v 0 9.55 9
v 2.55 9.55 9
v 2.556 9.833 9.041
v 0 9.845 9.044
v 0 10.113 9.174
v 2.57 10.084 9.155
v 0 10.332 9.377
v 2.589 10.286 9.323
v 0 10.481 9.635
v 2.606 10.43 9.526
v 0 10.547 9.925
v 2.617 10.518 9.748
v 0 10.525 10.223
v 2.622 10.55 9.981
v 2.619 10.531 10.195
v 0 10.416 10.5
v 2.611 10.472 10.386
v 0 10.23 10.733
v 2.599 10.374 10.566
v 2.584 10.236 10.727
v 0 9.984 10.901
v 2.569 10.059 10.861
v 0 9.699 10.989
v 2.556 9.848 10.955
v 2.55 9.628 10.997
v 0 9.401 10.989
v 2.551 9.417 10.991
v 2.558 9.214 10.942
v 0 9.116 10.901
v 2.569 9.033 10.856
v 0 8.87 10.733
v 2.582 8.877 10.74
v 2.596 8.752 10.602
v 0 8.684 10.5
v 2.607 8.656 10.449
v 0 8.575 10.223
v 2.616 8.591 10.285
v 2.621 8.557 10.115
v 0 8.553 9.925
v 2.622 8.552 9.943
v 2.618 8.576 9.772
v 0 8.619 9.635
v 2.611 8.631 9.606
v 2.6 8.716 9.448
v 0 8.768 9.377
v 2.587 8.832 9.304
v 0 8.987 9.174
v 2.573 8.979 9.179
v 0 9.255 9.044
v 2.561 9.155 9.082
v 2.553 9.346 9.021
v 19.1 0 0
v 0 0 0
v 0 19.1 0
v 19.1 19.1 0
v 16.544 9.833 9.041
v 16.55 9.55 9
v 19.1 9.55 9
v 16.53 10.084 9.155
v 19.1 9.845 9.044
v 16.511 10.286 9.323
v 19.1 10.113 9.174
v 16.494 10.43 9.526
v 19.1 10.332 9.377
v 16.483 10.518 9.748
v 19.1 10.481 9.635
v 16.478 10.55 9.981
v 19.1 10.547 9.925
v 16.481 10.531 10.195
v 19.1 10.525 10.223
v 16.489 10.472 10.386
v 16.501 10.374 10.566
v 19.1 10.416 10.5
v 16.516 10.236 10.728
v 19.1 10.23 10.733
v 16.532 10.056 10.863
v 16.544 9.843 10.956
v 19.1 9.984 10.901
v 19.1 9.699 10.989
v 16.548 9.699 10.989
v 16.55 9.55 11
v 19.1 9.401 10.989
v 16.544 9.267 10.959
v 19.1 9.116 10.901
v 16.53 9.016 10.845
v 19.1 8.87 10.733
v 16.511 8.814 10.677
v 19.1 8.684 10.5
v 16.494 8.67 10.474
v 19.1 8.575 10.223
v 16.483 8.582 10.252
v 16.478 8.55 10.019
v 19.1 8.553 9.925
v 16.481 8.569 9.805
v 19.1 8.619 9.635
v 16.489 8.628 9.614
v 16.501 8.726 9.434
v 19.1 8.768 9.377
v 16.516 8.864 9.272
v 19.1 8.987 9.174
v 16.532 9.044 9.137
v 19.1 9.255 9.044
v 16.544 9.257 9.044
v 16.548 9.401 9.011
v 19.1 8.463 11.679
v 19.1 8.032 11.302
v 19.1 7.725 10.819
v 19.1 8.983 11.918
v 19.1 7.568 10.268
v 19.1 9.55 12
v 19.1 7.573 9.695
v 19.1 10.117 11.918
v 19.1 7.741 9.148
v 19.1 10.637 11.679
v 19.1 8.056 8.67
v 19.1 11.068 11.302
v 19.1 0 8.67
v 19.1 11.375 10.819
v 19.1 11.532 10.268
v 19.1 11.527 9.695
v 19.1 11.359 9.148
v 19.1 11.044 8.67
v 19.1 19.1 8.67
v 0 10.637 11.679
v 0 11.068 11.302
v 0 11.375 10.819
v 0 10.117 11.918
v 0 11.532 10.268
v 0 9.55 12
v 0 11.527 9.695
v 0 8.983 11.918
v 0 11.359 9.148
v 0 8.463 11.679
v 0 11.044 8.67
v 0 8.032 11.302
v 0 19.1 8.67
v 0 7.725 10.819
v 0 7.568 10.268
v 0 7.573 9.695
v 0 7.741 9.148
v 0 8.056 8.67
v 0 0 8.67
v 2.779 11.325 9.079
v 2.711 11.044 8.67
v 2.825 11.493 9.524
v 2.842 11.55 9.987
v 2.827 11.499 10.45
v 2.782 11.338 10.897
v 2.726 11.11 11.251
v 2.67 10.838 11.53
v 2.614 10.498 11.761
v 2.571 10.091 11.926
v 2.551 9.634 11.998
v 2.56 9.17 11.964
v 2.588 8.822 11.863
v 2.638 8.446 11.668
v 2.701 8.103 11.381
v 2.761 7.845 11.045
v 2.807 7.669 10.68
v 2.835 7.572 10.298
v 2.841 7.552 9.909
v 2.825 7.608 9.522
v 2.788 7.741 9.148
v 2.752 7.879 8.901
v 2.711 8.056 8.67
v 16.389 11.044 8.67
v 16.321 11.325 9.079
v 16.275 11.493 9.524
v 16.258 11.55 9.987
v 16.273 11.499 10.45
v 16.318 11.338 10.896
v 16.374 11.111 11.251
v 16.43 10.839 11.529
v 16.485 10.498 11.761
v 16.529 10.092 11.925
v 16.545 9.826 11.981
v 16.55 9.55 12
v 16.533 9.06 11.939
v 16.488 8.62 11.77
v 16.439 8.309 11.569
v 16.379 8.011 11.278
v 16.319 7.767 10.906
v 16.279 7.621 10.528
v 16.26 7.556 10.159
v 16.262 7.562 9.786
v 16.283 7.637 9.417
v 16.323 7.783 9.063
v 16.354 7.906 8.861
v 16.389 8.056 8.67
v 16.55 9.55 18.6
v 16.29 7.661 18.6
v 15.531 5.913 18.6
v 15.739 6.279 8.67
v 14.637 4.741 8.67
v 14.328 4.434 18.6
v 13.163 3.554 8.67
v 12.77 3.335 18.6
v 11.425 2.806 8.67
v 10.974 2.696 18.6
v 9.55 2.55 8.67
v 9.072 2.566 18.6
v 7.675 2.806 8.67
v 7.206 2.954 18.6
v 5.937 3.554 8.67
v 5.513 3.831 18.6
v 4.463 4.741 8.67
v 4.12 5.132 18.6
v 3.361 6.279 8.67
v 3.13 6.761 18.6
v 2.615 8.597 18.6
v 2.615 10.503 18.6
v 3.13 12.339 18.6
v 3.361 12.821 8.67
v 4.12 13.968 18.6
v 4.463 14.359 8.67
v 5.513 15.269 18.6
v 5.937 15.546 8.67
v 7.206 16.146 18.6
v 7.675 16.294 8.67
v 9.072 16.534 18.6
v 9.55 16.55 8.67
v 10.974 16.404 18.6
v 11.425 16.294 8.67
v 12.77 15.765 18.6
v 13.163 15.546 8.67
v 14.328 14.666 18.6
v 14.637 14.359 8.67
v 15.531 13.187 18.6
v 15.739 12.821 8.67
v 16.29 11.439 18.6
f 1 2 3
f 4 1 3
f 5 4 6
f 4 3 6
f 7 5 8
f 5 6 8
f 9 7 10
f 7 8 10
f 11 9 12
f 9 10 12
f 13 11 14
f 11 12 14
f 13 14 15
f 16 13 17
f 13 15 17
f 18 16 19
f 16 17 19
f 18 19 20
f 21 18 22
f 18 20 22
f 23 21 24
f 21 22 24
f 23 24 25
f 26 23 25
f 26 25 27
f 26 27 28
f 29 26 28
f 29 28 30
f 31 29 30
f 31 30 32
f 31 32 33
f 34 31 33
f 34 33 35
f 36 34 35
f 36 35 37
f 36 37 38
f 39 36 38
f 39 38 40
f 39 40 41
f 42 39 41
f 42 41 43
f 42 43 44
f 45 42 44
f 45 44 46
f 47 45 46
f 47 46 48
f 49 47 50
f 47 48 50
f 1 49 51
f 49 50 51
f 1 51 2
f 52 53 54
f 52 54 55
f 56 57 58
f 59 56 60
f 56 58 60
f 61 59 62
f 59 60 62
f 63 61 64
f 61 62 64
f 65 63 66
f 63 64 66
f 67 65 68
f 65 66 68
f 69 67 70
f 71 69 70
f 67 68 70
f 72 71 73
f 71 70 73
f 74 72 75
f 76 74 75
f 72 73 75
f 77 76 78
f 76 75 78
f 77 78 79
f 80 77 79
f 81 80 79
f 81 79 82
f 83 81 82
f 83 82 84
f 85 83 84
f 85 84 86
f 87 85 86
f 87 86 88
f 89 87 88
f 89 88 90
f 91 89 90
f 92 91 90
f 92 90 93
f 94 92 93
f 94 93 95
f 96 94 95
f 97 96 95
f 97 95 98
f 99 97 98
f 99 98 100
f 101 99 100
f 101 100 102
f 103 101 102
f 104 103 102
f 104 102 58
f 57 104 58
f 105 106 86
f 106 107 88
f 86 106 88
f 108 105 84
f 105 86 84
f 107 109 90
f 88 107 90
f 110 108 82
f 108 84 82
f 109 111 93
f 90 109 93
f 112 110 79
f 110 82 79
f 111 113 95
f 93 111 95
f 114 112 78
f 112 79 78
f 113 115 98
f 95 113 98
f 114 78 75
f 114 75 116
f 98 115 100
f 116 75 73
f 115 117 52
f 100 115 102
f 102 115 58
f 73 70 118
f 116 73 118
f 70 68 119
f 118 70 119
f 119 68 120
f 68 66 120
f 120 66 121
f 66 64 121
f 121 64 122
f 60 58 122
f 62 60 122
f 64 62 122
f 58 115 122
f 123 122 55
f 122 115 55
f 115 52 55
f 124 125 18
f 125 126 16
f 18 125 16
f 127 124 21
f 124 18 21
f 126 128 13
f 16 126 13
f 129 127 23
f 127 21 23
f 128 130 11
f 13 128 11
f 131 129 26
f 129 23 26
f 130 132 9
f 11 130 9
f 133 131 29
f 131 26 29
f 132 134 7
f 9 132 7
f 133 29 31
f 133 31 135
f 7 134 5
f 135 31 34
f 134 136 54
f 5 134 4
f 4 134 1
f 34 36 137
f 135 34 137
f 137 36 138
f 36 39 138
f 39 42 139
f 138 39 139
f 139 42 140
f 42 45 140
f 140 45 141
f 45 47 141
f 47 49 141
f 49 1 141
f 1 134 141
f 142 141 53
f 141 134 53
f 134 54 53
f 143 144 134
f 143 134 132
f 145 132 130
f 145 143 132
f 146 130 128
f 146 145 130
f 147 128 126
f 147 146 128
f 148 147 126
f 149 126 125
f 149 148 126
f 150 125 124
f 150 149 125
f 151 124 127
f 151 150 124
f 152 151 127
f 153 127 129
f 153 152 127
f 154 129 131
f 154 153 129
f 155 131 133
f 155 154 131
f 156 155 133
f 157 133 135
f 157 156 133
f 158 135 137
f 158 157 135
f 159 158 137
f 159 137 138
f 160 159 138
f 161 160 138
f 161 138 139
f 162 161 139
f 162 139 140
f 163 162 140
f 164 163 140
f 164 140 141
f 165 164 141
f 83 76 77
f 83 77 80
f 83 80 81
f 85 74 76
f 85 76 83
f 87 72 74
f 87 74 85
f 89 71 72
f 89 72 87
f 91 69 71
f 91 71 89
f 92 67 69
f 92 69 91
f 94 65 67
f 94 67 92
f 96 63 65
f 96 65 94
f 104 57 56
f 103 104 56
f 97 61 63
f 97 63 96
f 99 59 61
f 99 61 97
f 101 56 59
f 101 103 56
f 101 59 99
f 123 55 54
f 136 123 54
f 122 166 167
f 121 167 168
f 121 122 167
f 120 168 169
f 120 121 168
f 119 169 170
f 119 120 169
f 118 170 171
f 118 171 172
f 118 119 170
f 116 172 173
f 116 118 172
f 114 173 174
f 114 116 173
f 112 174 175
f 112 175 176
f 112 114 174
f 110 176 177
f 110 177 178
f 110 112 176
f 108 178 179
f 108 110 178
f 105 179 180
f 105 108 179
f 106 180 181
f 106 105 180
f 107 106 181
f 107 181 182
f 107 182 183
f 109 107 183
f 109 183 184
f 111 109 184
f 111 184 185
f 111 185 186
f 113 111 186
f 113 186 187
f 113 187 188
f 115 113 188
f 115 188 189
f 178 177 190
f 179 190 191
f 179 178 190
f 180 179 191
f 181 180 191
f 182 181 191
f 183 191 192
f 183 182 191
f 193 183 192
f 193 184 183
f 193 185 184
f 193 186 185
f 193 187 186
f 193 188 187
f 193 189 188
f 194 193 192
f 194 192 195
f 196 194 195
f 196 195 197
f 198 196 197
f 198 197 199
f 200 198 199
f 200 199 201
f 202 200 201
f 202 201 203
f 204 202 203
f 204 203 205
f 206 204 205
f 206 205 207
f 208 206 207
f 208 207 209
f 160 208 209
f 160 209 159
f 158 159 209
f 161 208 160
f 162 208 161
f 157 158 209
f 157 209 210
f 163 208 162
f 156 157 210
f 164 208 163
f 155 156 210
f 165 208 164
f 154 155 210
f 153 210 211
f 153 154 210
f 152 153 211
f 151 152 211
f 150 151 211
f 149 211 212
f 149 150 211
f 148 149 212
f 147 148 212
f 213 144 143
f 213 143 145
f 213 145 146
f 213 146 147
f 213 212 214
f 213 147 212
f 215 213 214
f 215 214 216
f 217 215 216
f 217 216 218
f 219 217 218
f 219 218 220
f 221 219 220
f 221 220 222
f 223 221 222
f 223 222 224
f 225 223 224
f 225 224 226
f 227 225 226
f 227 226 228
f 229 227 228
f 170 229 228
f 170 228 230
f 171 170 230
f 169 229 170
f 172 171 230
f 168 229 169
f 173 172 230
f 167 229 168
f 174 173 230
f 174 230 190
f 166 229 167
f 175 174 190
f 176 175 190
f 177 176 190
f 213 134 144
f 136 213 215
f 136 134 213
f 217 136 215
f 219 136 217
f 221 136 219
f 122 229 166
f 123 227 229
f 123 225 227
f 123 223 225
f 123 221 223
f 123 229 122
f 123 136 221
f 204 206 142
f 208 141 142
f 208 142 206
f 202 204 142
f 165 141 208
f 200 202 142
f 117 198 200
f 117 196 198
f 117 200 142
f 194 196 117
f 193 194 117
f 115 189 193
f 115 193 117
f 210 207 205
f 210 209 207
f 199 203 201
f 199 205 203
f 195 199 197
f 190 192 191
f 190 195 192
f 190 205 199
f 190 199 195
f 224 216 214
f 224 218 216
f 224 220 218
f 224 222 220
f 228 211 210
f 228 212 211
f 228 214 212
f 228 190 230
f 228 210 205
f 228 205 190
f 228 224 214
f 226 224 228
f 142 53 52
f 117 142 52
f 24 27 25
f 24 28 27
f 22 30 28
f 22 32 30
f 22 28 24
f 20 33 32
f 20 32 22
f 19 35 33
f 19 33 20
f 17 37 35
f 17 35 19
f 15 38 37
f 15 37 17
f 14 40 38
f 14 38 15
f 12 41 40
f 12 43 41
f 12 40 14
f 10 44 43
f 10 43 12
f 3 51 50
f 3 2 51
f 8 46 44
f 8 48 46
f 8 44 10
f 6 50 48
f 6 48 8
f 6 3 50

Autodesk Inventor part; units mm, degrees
ref_plane "YZ Plane" through (0, 0, 0) normal (1, 0, 0) x (0, 1, 0)
ref_plane "XZ Plane" through (0, 0, 0) normal (0, 1, 0) x (-1, 0, 0)
ref_plane "XY Plane" through (0, 0, 0) normal (0, 0, 1) x (1, 0, 0)
sketch "Sketch1" plane through (0, 0, 0) normal (0, 0, 1) x (1, 0, 0)
  line L0 (0, 0) -> (19.1, 0)
  line L1 (19.1, 0) -> (19.1, 19.1)
  line L2 (19.1, 19.1) -> (0, 19.1)
  line L3 (0, 19.1) -> (0, 0)
  dimension "d0" = 19.1
  dimension "d1" = 19.1
extrude "Extrusion1" add sketch "Sketch1" along normal blind 8.67
sketch "Sketch2" plane through (19.1, 0, 0) normal (1, 0, 0) x (0, 0, -1)
  line L0 (0, 0) -> (0, 19.1) projected
  line L1 (0, 19.1) -> (-8.67, 19.1) projected
  line L2 (-8.67, 0) -> (-8.67, 19.1) projected
  line L3 (0, 0) -> (-8.67, 0) projected
  line L4 (0, 0) -> (0, 19.1) construction
  line L5 (0, 9.55) -> (-11, 9.55) construction
  line L6 (-11, 9.55) -> (-11, 16.3311) construction
  circle A0 centre (-10, 9.55) radius 1
  circle A1 centre (-10, 9.55) radius 2
  point P0 (-8.67, 11.0437)
  point P1 (-8.67, 8.0563)
  dimension "d4" = 11
  dimension "d5" = 2
  dimension "d6" = 4
extrude "Extrusion2" add sketch "Sketch2" against normal up to surface (19.1 mm away) contours A1 L2 picked at (-8.78, 9.55)
sketch "Sketch3" plane through (0, 0, 8.67) normal (0, 0, 1) x (1, 0, 0)
  line L0 (0, 11.0437) -> (19.1, 11.0437) projected
  line L1 (19.1, 11.0437) -> (19.1, 19.1) projected
  line L2 (19.1, 19.1) -> (0, 19.1) projected
  line L3 (0, 19.1) -> (0, 11.0437) projected
  line L4 (19.1, 8.0563) -> (0, 8.0563) projected
  line L5 (0, 8.0563) -> (0, 0) projected
  line L6 (0, 0) -> (19.1, 0) projected
  line L7 (19.1, 0) -> (19.1, 8.0563) projected
  line L8 (19.1, 19.1) -> (0, 19.1) construction
  line L9 (9.55, 19.1) -> (9.55, 0) construction
  circle A0 centre (9.55, 9.55) radius 7
  dimension "d9" = 14
extrude "Extrusion3" add sketch "Sketch3" along normal blind 9.93 contours A0 L0 | L0 A0 L4 | L4 A0
sketch "Sketch4" plane through (0, 0, 0) normal (0, -1, 0) x (1, 0, 0)
  line L0 (0, 0) -> (19.1, 0) projected
  line L1 (16.55, 18.6) -> (2.55, 18.6) projected
  dimension "d12" = 18.6
sketch "Sketch5" plane through (19.1, 0, 0) normal (1, 0, 0) x (0, 0, -1)
  line L0 (0, 0) -> (0, 19.1) projected
  line L1 (0, 9.55) -> (-151.3307, 9.55)
  line L2 (-18.6, 16.55) -> (-18.6, 2.55) projected
  line L3 (-18.6, 16.55) -> (-47.9586, 84.0702)
  line L4 (-18.6, 2.55) -> (-41.5927, -50.3296)
  dimension "d13" = 133
sketch "Sketch6" plane through (0, 19.1, 0) normal (0, 1, 0) x (1, 0, 0)
  line L0 (19.1, 0) -> (0, 0) projected
  line L1 (0, 0) -> (0, -8.67) projected
  line L2 (19.1, -8.67) -> (0, -8.67) projected
  line L3 (19.1, 0) -> (19.1, -8.67) projected
  line L4 (2.55, -18.6) -> (16.55, -18.6) projected
  line L5 (9.55, -18.6) -> (-223.0708, -119.7464)
  line L6 (9.55, -18.6) -> (332.284, -158.9287)
  line L7 (9.55, -18.6) -> (9.55, 0)
  line L8 (0, 0) -> (19.1, 0) projected
  dimension "d14" = 133
ref_plane "Work Plane1" through (0, 9.55, 0) normal (0, 1, 0) x (1, 0, 0)
sketch "Sketch7" plane through (0, 9.55, 0) normal (0, 1, 0) x (1, 0, 0)
  line L0 (9.55, -18.6) -> (-223.0708, -119.7464) projected
  line L1 (9.55, -18.6) -> (332.284, -158.9287) projected
  point P0 (0, 0)
properties part number "HDzero micro dummy"
